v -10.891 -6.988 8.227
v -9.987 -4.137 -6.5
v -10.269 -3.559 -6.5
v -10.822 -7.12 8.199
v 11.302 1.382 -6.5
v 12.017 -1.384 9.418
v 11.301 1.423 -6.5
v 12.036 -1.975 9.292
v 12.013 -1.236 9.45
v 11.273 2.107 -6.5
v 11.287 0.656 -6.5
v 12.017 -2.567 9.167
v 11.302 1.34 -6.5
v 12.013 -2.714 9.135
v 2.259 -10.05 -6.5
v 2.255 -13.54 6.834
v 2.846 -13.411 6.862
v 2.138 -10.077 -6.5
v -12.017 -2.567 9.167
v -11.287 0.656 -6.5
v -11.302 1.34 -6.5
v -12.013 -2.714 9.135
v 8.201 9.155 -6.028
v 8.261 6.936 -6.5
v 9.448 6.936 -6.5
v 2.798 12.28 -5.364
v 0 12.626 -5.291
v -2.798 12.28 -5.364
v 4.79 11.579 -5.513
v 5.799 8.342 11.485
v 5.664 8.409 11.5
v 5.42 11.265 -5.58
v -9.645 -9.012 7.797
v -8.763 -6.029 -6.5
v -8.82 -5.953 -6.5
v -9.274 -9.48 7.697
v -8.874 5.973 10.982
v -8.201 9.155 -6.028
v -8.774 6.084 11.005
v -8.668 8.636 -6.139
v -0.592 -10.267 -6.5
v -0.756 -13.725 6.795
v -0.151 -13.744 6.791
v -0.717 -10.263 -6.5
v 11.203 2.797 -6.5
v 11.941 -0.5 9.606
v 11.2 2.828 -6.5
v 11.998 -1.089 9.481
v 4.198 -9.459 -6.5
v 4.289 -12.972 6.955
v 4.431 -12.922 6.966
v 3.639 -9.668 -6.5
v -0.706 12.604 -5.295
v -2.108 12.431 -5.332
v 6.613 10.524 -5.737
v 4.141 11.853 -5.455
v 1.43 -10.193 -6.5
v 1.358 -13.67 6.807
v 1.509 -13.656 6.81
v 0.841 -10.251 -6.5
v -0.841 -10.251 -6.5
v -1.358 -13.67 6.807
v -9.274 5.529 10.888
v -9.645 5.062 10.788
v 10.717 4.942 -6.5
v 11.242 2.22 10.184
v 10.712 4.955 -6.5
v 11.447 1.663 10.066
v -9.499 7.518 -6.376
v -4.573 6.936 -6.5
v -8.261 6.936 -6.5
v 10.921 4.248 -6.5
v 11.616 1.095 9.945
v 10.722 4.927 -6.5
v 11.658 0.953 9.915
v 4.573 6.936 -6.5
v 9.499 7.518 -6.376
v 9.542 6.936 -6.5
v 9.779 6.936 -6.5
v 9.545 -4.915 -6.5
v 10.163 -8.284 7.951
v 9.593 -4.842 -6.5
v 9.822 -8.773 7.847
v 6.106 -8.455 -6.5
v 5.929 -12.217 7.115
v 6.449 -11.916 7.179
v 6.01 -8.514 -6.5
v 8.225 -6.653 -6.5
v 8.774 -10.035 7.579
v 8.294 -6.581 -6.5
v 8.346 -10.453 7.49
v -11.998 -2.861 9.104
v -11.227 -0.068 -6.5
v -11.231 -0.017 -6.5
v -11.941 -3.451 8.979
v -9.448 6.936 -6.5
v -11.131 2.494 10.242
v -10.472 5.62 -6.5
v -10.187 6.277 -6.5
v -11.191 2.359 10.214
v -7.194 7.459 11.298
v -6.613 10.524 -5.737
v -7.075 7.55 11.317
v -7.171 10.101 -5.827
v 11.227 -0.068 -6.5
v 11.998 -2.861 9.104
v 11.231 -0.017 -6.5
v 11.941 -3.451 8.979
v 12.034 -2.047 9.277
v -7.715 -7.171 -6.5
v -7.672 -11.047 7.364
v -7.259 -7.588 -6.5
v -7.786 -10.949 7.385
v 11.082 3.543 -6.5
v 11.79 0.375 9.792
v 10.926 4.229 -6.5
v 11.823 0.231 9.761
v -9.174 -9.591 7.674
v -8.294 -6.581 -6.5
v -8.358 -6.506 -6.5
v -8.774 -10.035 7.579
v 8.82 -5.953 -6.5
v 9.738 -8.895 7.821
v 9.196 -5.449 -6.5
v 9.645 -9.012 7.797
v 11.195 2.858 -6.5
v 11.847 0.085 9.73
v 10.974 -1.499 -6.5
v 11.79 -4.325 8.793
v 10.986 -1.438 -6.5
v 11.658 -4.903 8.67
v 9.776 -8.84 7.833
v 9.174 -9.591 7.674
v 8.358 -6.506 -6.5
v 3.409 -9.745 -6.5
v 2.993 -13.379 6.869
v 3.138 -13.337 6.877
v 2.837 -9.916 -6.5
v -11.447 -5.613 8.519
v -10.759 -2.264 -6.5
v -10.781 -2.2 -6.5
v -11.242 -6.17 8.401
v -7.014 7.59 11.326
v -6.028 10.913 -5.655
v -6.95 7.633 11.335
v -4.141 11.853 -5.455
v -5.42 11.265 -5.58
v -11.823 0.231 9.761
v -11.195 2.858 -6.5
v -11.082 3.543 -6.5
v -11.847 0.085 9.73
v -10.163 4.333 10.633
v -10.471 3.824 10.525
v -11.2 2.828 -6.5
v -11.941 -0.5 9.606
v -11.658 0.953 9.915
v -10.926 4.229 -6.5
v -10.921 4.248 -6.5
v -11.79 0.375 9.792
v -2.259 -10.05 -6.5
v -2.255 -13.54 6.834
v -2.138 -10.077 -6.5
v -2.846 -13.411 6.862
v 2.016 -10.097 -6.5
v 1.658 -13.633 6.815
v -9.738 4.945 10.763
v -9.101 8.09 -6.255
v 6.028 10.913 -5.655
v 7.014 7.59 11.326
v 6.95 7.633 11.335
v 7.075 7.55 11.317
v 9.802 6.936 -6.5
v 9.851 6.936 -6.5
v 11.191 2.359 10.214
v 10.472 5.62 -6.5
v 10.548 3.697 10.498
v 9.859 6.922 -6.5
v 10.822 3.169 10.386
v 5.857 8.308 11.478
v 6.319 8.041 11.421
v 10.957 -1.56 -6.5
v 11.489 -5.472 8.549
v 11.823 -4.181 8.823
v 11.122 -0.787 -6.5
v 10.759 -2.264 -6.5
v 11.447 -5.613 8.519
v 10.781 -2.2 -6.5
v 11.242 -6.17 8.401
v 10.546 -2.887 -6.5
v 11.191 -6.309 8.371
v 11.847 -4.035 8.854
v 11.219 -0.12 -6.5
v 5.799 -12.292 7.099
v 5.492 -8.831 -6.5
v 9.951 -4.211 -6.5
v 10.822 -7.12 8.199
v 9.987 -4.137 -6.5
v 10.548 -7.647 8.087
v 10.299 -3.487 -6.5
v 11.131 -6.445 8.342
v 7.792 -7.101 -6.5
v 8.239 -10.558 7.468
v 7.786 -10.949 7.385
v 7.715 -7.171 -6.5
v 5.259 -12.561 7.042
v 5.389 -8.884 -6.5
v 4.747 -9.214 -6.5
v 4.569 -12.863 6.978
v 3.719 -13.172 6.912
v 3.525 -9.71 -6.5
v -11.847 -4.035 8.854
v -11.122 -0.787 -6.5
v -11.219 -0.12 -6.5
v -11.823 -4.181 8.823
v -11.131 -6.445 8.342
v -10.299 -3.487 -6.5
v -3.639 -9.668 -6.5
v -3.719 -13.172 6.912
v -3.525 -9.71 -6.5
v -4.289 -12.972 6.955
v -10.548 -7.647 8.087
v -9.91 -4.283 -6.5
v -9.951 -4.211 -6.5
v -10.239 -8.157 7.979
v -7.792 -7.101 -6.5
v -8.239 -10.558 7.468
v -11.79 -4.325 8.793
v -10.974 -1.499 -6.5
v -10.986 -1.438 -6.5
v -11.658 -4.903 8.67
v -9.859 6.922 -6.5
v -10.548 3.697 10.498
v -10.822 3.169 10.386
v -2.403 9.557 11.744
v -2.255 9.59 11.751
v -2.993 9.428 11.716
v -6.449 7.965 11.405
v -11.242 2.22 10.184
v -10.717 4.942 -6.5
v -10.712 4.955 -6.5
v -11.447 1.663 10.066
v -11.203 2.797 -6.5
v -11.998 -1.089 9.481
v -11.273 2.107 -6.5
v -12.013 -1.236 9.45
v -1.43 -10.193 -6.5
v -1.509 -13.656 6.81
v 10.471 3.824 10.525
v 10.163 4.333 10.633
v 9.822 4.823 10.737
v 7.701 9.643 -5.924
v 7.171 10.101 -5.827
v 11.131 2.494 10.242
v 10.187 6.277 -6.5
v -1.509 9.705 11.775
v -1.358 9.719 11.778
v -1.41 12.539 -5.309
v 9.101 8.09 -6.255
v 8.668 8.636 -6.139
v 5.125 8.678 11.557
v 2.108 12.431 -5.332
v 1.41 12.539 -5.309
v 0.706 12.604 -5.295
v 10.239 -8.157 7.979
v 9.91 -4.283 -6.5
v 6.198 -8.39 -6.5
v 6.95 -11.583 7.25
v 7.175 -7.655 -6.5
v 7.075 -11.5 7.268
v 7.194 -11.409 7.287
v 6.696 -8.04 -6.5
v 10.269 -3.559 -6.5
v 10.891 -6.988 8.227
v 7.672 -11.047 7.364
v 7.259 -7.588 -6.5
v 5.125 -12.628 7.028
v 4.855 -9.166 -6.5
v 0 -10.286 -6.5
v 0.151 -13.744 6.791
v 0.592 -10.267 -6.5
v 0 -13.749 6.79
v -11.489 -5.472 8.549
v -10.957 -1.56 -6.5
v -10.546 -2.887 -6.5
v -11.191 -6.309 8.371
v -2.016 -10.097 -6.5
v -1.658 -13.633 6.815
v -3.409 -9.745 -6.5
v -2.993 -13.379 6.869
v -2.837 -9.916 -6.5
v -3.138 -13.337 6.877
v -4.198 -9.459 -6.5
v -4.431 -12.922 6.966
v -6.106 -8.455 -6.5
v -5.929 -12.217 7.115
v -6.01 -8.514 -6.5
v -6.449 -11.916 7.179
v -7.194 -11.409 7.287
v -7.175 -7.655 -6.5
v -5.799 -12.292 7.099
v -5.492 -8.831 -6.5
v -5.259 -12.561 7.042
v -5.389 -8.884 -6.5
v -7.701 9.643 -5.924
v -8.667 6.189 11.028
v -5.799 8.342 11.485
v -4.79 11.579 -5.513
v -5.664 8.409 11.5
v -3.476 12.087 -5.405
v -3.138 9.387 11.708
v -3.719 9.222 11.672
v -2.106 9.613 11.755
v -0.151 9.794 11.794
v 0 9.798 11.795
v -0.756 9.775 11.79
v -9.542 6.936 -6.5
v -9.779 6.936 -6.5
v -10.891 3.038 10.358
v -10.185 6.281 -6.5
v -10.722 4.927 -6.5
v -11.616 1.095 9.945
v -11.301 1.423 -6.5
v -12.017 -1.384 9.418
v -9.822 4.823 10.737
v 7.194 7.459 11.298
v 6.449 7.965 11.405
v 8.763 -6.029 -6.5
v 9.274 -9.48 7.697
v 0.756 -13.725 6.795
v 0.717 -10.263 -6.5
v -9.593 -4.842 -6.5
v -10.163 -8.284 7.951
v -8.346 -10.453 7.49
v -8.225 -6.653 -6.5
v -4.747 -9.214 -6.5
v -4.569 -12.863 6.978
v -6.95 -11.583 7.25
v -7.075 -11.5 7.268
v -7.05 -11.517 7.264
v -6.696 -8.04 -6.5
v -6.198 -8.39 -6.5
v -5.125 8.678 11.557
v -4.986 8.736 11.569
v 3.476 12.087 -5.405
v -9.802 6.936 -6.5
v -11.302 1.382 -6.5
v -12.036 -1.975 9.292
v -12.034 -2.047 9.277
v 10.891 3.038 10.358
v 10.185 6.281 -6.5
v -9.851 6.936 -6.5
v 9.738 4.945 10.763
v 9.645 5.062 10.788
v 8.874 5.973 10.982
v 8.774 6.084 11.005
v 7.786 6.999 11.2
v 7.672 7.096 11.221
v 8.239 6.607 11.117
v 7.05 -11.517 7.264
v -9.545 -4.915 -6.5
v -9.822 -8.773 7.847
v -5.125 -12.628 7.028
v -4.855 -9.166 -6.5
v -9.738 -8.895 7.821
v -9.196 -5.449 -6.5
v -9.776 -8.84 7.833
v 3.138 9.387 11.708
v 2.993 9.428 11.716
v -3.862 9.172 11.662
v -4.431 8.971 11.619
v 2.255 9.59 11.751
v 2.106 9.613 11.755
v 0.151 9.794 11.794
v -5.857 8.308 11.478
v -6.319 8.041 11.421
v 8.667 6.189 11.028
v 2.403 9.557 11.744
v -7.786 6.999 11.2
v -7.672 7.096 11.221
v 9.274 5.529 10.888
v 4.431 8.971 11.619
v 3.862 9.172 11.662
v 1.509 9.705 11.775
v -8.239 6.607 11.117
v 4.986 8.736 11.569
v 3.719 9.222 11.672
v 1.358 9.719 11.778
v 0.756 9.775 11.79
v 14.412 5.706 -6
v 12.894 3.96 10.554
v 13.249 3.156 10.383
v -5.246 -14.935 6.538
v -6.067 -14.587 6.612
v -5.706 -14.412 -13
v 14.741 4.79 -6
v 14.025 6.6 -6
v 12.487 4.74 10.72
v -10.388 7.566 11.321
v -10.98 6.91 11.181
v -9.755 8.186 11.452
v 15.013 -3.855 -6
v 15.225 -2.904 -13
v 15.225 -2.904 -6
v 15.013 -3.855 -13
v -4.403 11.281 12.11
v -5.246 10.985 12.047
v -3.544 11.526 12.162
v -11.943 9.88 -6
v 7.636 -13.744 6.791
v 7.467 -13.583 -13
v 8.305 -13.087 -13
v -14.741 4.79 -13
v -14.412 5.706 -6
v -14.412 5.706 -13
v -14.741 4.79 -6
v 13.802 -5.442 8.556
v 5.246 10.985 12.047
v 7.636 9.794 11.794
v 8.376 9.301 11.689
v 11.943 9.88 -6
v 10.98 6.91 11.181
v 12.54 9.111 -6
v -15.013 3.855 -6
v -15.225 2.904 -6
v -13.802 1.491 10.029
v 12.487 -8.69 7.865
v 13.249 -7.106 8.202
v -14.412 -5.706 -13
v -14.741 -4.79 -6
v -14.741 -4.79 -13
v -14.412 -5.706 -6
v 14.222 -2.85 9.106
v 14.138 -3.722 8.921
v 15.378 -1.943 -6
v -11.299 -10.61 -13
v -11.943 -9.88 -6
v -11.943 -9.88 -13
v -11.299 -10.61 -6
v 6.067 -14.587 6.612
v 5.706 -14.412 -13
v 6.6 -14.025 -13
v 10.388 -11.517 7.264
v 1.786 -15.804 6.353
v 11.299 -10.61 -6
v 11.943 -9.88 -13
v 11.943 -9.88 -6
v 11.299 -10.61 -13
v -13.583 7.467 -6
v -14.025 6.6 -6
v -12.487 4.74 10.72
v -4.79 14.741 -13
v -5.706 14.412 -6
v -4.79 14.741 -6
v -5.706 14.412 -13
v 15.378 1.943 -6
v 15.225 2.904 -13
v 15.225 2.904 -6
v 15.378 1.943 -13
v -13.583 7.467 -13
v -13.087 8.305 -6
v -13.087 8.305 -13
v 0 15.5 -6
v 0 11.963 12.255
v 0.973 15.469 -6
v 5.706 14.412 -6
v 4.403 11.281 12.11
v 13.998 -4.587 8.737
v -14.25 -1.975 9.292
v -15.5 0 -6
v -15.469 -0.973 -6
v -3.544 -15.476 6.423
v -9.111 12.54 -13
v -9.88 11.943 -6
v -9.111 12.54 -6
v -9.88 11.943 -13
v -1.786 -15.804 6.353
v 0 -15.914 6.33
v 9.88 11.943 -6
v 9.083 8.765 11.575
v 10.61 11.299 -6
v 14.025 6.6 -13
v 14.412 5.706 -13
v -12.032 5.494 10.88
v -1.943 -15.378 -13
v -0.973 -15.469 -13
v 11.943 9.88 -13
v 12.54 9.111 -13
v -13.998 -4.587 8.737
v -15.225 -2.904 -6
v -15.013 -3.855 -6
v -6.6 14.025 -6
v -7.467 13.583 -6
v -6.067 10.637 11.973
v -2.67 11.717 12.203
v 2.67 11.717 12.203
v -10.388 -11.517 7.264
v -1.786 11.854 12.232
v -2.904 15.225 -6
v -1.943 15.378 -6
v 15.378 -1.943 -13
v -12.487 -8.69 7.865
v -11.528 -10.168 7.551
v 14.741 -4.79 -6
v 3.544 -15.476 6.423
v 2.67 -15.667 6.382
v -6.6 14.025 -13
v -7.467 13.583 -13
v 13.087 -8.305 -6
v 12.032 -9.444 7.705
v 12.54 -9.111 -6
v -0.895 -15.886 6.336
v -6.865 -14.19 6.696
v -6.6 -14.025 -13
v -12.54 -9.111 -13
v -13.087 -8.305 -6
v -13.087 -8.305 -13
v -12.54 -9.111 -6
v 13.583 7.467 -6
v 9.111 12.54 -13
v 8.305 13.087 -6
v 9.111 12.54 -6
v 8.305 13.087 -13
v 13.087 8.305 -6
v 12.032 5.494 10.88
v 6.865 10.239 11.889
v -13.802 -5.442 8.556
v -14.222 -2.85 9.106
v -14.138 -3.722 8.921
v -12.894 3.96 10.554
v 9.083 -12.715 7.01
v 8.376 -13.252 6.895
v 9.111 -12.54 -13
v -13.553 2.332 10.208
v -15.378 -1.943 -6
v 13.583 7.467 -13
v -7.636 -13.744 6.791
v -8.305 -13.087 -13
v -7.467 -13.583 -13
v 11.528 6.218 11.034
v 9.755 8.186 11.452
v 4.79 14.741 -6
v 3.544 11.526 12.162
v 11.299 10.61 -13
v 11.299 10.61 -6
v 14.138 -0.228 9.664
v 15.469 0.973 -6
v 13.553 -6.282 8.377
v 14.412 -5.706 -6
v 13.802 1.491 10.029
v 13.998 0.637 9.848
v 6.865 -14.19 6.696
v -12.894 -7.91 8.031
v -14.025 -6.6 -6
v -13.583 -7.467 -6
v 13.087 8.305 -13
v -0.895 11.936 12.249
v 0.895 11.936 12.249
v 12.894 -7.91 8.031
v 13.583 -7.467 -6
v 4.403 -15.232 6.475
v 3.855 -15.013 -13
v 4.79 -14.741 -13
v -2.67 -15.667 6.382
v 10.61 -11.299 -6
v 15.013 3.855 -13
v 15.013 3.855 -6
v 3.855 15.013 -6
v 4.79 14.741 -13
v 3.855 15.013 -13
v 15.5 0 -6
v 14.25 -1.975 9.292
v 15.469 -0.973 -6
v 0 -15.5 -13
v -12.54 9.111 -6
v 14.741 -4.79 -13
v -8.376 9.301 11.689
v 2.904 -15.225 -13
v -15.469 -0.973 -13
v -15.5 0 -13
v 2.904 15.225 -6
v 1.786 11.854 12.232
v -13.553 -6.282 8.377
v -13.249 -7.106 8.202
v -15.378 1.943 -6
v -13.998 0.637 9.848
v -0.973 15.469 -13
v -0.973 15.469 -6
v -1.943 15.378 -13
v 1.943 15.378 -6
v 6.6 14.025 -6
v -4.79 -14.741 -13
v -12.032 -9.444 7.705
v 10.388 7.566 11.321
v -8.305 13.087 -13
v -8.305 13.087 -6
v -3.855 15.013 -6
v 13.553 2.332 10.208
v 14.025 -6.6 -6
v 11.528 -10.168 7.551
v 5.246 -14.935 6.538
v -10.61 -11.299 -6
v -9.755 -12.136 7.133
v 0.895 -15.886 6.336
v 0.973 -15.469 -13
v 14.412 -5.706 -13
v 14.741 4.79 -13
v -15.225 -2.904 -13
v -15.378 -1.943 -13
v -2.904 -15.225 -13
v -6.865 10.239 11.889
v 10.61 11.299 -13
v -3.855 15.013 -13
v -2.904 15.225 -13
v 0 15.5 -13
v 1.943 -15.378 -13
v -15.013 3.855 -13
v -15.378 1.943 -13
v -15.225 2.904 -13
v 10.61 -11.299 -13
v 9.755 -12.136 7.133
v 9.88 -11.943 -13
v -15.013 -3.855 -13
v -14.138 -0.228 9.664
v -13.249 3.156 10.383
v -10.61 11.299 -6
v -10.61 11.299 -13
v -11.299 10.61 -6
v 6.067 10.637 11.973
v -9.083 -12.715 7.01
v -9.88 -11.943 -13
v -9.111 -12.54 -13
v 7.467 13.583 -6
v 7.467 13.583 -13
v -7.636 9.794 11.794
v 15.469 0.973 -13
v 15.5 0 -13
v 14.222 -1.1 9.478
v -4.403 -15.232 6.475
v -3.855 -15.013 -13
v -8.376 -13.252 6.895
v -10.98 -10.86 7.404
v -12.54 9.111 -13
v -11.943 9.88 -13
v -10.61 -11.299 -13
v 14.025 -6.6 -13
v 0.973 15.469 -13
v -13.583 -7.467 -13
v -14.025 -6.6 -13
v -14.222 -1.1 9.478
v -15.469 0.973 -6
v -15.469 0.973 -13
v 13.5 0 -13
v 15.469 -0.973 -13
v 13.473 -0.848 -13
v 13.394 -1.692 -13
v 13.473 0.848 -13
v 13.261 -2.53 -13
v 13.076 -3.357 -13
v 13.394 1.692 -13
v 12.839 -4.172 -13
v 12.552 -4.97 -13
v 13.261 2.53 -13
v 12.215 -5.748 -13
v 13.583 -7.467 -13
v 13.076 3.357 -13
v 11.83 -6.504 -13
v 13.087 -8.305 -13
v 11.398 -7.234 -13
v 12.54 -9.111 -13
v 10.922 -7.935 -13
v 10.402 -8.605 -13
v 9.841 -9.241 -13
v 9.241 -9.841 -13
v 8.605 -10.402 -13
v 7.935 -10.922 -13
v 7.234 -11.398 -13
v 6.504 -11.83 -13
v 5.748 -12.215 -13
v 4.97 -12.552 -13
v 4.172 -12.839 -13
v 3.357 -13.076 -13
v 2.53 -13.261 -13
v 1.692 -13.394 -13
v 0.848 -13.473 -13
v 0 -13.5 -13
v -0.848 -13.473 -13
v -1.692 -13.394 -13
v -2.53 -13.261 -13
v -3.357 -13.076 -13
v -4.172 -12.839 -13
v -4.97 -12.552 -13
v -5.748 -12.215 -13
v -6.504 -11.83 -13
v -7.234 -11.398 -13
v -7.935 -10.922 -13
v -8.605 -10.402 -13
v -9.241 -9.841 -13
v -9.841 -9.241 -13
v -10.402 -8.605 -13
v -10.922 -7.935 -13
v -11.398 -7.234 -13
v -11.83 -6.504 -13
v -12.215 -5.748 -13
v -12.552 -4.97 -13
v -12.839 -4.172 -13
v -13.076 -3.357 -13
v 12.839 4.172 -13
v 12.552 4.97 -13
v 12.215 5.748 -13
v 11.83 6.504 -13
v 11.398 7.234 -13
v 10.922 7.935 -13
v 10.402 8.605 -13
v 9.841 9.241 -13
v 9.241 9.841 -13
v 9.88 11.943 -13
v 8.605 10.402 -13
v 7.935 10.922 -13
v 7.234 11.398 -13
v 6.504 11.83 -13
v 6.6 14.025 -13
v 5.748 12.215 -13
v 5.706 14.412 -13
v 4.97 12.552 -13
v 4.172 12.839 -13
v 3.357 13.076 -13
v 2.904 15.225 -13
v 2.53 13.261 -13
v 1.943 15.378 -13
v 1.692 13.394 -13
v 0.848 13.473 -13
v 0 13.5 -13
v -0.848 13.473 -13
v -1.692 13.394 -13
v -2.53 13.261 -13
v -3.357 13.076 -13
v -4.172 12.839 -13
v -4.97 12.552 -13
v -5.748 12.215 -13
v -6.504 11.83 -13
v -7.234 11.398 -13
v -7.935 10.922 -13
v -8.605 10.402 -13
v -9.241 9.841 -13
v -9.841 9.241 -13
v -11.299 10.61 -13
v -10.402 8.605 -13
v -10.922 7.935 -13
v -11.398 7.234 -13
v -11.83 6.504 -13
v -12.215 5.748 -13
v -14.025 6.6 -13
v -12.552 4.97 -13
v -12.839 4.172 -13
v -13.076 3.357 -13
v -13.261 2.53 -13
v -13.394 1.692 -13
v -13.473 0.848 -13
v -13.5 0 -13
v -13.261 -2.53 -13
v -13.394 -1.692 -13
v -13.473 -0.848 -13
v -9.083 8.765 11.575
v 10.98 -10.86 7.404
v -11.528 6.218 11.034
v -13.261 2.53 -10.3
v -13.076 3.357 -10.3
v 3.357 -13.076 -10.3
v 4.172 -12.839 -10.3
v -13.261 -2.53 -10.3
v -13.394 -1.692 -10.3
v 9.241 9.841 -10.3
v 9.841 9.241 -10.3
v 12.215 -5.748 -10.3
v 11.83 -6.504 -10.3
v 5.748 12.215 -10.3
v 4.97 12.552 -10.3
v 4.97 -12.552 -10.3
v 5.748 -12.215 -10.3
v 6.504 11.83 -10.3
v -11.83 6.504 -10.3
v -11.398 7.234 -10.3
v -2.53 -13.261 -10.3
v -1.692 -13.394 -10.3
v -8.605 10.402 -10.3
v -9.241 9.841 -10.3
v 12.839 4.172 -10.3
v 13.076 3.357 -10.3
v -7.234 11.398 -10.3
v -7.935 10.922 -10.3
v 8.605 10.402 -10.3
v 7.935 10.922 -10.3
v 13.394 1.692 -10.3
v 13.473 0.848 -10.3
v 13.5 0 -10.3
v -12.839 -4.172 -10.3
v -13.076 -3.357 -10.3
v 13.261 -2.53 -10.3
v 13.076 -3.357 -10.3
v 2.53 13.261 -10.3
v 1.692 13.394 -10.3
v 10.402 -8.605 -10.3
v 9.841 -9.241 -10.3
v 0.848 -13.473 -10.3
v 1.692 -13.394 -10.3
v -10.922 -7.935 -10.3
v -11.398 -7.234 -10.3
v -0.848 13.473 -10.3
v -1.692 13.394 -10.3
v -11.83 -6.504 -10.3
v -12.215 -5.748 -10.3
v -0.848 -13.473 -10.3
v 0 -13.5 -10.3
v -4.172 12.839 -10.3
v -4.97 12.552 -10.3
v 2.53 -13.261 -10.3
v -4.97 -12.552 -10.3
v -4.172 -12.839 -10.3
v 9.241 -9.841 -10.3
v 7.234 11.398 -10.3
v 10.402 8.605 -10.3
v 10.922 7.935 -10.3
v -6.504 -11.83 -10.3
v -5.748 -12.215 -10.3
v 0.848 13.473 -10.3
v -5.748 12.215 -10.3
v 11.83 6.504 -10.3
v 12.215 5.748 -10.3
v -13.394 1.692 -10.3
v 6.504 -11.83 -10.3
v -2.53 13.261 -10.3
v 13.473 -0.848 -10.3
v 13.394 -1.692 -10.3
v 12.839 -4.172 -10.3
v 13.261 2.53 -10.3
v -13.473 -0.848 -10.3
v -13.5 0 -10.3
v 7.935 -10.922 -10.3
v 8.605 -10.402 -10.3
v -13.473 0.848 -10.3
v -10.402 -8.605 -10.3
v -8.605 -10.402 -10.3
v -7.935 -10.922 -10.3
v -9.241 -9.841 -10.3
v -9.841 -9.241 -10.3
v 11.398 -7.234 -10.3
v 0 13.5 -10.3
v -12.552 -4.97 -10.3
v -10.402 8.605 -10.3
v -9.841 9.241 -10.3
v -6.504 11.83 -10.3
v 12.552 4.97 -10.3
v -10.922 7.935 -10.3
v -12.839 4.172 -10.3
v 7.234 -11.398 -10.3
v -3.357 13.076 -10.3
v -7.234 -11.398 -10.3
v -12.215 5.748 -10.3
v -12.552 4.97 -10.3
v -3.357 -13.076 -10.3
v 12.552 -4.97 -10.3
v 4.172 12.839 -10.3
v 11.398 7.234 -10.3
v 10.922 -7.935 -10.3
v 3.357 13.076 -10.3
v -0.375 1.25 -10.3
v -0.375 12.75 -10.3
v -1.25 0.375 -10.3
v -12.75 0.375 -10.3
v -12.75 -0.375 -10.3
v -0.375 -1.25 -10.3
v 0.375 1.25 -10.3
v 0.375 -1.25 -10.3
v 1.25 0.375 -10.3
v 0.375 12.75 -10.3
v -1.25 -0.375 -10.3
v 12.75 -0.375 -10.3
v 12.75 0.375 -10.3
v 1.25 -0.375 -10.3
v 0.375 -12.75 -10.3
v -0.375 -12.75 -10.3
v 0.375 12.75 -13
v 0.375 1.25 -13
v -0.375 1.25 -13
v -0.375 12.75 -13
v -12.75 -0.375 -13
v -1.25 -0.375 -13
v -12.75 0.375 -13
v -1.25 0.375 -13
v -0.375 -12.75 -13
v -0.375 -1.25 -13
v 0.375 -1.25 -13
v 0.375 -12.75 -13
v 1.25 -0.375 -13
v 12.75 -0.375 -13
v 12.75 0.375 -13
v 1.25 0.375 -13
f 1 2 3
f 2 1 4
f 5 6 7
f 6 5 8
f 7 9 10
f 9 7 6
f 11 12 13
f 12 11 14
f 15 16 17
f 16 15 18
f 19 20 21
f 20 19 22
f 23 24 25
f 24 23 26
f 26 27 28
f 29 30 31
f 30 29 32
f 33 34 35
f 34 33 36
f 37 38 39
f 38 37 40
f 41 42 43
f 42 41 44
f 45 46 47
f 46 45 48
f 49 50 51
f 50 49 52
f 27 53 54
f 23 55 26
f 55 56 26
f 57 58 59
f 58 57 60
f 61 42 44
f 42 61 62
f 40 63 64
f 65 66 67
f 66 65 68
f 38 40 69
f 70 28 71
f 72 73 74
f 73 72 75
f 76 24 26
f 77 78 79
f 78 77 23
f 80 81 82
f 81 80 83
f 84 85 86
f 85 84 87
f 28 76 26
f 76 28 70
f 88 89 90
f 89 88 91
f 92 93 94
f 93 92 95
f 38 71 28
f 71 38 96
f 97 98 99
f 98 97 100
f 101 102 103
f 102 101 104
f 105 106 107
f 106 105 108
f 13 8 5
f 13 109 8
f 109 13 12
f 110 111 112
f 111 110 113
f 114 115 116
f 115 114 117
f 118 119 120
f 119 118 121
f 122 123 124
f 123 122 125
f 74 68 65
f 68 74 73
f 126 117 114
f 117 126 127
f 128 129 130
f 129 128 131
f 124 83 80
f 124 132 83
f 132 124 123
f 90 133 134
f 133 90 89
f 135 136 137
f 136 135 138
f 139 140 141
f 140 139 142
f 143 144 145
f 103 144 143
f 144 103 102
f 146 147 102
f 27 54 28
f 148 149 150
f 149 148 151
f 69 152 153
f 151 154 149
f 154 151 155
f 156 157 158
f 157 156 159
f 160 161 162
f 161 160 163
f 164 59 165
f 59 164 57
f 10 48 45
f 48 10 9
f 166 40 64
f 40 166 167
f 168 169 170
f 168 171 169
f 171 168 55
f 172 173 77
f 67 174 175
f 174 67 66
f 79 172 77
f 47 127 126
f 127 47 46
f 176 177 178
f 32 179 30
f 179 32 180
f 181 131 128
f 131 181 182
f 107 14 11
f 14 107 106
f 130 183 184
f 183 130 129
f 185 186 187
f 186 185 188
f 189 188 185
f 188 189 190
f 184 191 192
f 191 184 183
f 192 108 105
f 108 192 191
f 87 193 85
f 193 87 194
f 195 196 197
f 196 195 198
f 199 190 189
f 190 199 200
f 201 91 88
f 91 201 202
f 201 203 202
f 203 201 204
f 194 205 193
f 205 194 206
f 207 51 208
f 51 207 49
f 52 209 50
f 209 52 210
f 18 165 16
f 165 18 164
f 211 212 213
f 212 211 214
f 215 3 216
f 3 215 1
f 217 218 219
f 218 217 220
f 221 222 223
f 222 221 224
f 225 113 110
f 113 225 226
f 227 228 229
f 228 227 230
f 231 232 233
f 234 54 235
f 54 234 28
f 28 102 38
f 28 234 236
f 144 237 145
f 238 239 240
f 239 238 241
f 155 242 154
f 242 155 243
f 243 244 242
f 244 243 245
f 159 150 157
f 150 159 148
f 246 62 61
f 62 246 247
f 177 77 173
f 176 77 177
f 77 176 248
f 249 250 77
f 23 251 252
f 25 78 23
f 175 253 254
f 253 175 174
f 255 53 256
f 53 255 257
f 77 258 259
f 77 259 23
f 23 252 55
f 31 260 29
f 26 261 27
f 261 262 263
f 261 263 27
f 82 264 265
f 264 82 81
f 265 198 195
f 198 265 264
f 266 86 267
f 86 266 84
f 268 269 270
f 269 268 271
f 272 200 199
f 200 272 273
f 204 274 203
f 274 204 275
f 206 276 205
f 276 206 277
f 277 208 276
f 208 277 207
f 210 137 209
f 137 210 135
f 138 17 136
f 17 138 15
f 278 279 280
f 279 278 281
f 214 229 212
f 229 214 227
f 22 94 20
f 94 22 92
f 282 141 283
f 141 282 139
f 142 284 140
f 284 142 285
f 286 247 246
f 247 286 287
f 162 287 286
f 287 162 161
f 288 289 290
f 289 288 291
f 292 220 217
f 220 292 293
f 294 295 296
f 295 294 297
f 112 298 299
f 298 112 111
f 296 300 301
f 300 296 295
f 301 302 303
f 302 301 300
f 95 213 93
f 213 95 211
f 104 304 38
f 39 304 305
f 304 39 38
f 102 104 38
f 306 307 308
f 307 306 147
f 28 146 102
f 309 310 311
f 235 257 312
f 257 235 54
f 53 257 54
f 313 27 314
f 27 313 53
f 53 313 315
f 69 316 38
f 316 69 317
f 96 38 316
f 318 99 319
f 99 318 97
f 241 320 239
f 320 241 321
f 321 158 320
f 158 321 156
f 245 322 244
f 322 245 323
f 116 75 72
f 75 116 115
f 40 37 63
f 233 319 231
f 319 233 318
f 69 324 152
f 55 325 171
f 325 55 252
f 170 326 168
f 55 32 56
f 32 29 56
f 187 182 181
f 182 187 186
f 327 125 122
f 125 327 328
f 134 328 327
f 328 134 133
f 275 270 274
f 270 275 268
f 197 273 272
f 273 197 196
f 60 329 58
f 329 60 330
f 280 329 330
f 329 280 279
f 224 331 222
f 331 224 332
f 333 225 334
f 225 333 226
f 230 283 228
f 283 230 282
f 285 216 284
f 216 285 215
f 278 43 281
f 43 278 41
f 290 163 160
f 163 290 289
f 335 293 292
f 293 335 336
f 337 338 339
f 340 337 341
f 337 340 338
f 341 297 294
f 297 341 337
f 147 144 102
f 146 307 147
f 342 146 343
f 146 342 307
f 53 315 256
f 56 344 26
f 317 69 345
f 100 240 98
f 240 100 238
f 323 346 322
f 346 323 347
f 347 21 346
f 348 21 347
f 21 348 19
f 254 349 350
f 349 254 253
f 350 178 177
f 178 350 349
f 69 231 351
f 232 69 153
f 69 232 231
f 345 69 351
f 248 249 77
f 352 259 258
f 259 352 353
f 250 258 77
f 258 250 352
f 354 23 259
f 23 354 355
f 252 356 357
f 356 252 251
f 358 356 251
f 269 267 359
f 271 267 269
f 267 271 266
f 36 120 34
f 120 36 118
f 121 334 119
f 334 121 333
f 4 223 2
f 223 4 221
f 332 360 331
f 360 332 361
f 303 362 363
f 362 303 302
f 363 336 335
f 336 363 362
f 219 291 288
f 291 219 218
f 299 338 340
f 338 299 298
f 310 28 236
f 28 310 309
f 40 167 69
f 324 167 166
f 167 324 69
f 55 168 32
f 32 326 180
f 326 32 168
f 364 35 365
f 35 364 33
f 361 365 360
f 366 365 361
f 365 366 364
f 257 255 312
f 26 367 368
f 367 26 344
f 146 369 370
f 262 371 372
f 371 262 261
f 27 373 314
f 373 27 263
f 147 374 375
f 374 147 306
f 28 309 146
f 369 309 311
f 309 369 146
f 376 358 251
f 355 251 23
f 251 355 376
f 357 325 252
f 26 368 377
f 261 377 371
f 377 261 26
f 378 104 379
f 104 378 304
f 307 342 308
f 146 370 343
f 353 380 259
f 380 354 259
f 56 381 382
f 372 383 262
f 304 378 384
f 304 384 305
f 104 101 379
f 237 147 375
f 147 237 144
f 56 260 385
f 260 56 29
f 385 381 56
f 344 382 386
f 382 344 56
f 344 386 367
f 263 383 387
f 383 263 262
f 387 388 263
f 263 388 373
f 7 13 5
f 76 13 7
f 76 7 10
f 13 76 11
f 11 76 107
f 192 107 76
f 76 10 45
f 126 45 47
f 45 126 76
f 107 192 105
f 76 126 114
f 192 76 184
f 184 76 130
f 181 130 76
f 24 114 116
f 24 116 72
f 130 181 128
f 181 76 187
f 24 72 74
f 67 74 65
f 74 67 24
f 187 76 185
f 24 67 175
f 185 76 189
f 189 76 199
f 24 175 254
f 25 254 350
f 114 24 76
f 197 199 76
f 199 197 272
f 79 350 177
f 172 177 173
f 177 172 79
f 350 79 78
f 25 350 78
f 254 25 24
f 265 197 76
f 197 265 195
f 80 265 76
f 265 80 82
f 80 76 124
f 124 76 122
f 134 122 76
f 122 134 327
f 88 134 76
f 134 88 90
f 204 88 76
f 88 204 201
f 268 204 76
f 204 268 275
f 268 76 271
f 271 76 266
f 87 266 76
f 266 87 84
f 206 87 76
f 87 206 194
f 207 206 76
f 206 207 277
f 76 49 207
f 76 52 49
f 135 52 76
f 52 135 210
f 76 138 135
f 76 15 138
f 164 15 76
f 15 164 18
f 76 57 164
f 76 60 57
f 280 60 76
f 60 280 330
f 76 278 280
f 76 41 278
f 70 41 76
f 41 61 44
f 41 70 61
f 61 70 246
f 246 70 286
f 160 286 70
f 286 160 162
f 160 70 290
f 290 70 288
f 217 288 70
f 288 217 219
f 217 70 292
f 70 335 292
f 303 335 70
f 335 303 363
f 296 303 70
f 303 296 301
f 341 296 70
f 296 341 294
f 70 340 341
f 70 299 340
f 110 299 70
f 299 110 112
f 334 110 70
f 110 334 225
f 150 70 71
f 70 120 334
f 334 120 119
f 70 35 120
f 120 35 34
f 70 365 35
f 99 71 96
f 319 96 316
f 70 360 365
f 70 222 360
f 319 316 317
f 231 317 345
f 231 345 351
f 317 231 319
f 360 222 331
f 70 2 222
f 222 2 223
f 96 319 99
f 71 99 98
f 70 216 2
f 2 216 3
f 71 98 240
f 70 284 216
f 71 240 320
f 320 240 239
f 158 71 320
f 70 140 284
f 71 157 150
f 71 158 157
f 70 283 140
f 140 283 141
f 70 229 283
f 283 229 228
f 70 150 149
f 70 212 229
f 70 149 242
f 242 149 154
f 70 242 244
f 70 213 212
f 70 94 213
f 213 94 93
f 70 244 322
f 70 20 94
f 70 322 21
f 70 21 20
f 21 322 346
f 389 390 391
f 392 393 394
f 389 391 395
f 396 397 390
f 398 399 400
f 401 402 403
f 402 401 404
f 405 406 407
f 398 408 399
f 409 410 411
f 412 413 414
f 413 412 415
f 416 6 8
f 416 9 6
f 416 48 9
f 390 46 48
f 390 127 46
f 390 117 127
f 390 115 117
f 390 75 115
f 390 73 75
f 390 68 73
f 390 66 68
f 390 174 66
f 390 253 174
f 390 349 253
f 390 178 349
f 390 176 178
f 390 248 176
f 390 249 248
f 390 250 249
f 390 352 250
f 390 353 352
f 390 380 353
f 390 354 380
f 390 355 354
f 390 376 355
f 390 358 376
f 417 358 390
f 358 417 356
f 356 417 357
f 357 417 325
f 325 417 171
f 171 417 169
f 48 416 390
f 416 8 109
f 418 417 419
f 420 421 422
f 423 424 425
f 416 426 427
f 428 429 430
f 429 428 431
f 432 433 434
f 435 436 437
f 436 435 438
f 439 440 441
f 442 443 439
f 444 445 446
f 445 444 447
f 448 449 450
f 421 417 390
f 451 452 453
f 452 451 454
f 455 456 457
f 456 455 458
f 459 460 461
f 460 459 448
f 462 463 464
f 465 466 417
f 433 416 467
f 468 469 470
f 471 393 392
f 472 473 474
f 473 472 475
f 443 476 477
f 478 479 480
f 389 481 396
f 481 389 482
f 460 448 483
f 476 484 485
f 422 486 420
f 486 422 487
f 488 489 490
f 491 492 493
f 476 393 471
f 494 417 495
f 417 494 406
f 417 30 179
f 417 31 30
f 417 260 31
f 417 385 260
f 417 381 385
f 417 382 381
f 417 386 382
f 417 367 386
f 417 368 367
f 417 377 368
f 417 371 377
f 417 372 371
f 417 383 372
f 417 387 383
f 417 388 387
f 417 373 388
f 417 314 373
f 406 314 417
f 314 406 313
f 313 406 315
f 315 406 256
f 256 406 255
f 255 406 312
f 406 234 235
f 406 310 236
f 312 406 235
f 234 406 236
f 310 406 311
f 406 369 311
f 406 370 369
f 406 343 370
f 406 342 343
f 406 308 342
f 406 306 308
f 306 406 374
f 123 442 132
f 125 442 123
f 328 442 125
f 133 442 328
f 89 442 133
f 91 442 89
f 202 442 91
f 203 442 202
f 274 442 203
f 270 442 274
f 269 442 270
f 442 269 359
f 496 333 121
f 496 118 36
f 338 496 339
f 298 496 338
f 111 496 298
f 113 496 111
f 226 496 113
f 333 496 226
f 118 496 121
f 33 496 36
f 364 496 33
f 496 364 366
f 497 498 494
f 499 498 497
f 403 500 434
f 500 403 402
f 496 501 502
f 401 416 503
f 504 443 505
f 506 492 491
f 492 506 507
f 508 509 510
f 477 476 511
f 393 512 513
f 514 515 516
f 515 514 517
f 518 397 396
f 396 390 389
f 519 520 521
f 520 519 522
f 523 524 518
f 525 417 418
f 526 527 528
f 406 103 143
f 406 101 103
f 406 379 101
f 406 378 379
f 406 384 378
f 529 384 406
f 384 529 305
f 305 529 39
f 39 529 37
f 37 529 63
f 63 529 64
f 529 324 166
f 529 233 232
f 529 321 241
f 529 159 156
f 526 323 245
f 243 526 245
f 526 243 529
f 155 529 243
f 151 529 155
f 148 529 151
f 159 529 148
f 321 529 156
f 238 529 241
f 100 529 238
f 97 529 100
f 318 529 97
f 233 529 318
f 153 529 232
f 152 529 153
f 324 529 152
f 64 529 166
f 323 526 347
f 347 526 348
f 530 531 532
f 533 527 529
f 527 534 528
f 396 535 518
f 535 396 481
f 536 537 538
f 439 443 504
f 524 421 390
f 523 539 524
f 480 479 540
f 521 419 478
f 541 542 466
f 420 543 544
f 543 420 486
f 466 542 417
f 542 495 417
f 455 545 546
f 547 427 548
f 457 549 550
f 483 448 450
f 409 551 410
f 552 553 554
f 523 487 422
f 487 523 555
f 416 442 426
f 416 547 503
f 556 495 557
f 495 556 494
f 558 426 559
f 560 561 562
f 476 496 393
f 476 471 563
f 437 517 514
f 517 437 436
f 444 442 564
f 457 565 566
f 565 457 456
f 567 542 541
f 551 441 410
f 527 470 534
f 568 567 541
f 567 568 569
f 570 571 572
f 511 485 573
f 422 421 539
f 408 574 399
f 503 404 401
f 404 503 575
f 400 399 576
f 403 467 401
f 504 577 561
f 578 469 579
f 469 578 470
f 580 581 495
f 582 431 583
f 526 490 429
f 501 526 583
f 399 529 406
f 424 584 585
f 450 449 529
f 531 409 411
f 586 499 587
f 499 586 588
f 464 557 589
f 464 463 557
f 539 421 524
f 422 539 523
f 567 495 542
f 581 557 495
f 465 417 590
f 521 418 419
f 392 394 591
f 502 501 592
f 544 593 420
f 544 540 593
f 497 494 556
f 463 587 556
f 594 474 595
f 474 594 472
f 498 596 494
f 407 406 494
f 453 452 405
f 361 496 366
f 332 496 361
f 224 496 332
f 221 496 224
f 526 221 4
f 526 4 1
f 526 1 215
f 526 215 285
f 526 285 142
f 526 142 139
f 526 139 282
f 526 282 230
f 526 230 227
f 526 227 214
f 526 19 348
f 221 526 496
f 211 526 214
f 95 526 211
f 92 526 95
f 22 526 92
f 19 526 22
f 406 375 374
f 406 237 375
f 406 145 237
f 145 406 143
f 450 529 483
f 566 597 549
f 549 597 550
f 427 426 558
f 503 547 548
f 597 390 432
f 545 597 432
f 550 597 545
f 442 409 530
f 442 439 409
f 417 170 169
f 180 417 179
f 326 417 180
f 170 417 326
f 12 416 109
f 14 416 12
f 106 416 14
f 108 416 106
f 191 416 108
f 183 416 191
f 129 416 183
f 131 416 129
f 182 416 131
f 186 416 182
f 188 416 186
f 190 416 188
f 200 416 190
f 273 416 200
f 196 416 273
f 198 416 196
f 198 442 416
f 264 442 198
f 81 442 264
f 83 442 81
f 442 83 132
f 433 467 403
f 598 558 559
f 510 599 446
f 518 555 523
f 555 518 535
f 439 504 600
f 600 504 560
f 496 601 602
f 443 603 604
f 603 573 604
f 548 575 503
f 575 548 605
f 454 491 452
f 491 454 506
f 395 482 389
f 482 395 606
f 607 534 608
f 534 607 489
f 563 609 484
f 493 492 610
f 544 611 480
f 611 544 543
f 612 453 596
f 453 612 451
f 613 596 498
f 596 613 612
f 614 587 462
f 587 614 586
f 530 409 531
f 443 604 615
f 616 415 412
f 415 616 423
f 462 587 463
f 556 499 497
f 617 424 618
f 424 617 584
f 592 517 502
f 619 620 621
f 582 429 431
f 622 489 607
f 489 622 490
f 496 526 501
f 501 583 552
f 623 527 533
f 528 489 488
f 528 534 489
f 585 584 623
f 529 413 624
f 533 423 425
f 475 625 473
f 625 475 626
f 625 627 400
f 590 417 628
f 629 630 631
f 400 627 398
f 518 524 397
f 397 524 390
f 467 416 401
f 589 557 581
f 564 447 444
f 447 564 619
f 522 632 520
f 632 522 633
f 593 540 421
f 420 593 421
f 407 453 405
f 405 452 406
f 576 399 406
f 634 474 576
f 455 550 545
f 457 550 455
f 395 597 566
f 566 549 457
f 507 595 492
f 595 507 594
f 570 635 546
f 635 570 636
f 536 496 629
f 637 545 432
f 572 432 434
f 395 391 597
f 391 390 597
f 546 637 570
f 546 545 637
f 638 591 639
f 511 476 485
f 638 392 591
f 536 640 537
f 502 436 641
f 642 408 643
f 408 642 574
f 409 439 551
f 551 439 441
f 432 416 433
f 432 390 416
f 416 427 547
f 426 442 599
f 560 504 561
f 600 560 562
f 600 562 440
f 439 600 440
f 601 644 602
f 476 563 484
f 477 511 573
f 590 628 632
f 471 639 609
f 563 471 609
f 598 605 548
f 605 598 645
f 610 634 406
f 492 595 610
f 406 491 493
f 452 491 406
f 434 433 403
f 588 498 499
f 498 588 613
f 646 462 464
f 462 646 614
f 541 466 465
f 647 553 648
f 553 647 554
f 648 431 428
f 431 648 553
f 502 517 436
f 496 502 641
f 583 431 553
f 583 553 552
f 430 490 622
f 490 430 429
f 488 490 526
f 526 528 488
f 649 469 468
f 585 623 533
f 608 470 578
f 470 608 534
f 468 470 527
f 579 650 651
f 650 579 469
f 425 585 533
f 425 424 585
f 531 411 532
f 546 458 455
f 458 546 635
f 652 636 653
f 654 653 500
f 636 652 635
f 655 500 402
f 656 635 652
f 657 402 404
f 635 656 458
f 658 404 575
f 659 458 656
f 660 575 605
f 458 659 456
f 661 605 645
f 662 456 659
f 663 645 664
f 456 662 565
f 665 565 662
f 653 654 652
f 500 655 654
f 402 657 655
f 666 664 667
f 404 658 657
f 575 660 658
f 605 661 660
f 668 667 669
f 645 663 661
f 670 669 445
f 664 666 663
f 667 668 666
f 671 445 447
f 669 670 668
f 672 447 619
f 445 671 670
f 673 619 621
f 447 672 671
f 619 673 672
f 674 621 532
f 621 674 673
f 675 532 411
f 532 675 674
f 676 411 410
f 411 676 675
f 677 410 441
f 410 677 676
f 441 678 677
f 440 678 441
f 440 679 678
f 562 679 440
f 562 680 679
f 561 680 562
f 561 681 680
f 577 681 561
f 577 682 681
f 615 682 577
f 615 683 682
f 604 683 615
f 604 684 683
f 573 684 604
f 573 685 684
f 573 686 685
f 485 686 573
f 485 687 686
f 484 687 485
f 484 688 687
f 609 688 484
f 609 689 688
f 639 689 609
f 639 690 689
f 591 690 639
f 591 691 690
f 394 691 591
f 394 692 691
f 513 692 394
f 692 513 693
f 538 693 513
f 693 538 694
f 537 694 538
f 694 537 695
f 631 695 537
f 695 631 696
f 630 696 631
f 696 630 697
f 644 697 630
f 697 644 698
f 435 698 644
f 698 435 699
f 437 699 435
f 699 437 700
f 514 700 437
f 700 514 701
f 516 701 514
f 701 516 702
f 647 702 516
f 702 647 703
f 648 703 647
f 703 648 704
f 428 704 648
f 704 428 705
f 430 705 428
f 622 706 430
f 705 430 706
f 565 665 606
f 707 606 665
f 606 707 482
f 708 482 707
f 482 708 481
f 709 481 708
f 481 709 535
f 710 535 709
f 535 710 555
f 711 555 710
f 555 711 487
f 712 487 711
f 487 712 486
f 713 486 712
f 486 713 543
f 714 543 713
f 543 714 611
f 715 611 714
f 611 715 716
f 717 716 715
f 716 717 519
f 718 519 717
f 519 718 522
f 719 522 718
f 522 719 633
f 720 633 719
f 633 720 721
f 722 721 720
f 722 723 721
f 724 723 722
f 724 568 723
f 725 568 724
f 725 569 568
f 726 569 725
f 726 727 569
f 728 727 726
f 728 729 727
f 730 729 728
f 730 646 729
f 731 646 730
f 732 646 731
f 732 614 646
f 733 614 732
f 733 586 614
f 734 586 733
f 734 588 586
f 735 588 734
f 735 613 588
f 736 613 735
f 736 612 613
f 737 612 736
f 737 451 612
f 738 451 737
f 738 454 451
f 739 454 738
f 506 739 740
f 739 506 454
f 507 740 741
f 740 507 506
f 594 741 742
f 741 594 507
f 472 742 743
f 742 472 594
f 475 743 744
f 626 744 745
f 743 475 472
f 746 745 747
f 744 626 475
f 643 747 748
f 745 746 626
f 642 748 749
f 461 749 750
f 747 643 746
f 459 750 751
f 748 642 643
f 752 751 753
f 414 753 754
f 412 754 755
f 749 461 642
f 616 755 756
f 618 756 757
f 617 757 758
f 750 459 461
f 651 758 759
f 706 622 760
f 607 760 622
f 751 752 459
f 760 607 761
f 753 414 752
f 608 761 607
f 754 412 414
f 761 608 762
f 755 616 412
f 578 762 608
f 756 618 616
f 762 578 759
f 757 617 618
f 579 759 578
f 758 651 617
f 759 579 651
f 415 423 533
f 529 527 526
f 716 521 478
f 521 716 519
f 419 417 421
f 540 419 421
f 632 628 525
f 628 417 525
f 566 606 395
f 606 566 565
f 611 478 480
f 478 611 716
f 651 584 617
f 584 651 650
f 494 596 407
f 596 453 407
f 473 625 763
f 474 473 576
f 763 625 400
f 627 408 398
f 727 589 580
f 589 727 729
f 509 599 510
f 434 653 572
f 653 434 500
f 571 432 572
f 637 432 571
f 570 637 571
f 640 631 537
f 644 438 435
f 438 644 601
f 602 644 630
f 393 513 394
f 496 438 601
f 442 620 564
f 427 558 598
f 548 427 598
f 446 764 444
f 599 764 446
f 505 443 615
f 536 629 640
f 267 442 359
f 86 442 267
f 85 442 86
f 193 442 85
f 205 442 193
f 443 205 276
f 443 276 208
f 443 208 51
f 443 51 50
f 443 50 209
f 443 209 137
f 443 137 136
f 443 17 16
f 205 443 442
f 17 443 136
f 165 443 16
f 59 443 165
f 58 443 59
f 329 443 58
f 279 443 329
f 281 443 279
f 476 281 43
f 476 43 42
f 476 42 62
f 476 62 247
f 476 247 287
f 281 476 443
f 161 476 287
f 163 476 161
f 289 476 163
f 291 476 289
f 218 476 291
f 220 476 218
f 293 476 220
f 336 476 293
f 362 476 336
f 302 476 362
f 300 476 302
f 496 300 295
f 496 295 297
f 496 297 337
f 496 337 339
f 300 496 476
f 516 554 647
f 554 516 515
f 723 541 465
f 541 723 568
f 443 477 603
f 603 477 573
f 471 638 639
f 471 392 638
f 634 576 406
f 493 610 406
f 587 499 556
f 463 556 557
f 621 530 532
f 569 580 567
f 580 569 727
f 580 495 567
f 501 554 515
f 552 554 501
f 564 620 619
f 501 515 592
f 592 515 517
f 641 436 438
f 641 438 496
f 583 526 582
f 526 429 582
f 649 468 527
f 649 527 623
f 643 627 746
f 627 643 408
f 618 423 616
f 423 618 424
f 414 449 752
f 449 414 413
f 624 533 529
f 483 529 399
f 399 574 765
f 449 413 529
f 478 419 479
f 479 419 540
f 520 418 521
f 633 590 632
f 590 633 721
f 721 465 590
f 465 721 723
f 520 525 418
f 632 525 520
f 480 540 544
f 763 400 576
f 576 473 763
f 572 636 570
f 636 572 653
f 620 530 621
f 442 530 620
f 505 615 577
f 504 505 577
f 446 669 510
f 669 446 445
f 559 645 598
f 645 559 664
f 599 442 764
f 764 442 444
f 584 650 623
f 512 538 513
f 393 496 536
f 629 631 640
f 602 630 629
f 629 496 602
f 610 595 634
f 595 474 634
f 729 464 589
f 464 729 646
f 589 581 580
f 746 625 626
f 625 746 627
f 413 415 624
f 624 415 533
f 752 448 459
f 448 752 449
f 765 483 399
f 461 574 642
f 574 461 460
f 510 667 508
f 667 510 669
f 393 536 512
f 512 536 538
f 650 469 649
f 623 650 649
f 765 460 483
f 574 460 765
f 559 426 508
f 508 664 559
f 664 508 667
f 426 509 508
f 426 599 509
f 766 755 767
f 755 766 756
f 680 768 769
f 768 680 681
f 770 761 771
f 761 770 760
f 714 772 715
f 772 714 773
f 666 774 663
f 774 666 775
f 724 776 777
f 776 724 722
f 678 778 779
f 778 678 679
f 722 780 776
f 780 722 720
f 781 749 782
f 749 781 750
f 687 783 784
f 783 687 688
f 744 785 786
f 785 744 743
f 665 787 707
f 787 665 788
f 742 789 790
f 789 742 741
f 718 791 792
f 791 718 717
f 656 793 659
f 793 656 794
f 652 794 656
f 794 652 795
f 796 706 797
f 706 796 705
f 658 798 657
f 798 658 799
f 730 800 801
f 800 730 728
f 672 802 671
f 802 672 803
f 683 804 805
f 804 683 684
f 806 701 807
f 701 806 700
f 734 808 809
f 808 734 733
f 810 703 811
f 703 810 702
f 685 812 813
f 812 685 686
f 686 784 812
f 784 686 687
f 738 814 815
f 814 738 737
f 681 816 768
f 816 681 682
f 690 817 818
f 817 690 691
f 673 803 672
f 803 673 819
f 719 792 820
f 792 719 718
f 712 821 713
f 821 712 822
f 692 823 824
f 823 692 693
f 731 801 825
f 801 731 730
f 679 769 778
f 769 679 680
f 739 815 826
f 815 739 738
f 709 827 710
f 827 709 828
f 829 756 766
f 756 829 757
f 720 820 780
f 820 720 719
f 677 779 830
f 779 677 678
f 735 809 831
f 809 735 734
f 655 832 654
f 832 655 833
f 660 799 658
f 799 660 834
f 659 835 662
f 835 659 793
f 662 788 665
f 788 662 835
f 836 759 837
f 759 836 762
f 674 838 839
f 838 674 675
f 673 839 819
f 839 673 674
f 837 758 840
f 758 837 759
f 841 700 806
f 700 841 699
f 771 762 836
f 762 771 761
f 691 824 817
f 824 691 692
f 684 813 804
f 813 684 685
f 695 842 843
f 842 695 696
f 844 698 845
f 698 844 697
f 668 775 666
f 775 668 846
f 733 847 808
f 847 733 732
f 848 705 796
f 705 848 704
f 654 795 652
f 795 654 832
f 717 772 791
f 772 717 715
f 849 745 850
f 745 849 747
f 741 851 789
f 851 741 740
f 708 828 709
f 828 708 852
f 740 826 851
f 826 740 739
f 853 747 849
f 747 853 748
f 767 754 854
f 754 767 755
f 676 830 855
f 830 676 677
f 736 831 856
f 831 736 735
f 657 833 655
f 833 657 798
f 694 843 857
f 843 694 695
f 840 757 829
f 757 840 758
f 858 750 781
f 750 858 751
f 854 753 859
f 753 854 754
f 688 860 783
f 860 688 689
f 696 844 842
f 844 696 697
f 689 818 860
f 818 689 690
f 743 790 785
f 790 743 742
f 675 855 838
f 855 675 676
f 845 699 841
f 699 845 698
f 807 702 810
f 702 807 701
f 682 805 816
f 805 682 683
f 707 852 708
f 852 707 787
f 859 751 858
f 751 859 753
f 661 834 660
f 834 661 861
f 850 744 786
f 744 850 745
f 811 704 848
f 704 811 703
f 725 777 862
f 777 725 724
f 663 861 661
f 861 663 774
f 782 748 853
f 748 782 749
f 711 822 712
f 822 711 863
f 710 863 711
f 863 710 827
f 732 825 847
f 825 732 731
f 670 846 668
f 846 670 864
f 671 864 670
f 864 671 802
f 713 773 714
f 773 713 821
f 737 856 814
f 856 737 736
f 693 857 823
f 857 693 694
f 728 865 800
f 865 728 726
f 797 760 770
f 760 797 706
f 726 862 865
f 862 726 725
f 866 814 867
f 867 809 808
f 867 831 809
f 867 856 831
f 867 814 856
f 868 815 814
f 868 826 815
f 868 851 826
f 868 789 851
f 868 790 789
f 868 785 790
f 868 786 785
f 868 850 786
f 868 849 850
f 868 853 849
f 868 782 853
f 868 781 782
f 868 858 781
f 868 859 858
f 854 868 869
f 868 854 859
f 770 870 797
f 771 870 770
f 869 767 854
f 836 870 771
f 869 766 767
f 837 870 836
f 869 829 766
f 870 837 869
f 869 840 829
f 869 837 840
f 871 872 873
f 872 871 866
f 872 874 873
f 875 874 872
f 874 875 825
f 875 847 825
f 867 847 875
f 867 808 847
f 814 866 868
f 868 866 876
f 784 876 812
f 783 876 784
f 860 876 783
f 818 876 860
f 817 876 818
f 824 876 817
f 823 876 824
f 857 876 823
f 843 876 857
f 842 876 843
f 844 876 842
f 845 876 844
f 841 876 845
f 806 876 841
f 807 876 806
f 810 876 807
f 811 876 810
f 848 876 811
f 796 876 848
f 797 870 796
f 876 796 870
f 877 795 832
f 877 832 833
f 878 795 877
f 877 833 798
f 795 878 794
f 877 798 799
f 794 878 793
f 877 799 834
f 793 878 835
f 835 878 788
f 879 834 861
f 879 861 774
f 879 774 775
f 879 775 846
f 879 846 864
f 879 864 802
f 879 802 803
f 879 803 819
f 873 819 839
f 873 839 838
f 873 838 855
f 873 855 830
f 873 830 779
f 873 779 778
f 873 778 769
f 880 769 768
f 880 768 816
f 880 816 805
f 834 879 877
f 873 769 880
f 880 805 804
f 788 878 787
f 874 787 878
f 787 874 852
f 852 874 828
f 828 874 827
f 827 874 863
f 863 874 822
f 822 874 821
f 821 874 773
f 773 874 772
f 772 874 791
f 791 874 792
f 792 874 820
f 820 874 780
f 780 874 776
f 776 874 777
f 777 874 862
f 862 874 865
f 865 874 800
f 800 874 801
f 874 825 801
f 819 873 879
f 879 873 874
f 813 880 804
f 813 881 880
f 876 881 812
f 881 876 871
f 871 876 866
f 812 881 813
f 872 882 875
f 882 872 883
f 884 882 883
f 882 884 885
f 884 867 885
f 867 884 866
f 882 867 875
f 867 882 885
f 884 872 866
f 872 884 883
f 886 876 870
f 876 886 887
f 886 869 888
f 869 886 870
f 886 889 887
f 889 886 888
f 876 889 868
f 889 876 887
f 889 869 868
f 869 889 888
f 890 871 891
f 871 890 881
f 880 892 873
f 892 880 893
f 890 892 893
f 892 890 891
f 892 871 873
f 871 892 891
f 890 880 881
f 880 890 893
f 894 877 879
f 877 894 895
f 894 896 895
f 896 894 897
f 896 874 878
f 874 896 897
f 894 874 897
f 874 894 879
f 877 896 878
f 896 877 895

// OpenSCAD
//
// Kitchen Chair footpad that holds a 1" diameter felt pad
// Keeps the pad from sliding off by providing a small lip
//

Quality = 100; // [25:Draft,100:Production]

// mm
Leg_Bottom_Diameter = 22.5; // [15:50]

// mm
Leg_Top_Diameter = 24.5; // [15:50]

//degrees
Leg_Angle = 12; // [0:20]

// mm
Leg_Cup_Height = 13; // [10:30]

// mm
Felt_Diameter = 27; // [15:52]

// mm
Felt_Height = 5; // [3:10]

// put thin break-away supports under the felt cup
Include_Supports = 1; // [1:Yes,0:No]

// BELOW HERE VARIABLES THAT ARE NOT CUSTOMIZABLE

$fn = Quality;
wall = 2*1;

// Create the thing

union() {
	difference() {
		hull() {
			rotate([Leg_Angle,0,0]) {
				cylinder(r1=Leg_Bottom_Diameter/2+wall, 
						r2=Leg_Top_Diameter/2+wall, 
						h=Leg_Cup_Height+3*wall,
						center=true);
			}
		
			// felt holder
			translate([0,0,-(Leg_Cup_Height+3*wall)/2]) {
				cylinder(r=Felt_Diameter/2 + wall, 
					h=Felt_Height+wall, 
					center=true);
			}
		
		}
	
		// carve out holes for leg and felt
		difference() {
		   rotate([Leg_Angle,0,0])
				translate([0,0,1.6*wall])
					cylinder(r1=Leg_Bottom_Diameter/2, 
						r2=Leg_Top_Diameter/2, 
						h=Leg_Cup_Height+Felt_Height+2*wall,
						center=true);
			translate([0,0,-(5+Leg_Cup_Height+Felt_Height+0*wall)/2])
				cube([200,200,10],center=true);
		}
	
		translate([0,0,-(0.1+Leg_Cup_Height+Felt_Height+3*wall)/2])
			cylinder(r=Felt_Diameter/2, 
				h=Felt_Height/2+1, 
				center=true);
	
	}

	if (Include_Supports) {
		// add in break-away supports under the felt cup, the bridge is
		// a little too far.
	
		for (rot = [0:90:359])
			rotate([0,0,rot])
				translate([0,Felt_Height+wall,-(Leg_Cup_Height+Felt_Height+3*wall-Felt_Height/2+1)/2])
					cube([0.75, Felt_Diameter/2-wall, Felt_Height/2+1], center=true);
	}

}



